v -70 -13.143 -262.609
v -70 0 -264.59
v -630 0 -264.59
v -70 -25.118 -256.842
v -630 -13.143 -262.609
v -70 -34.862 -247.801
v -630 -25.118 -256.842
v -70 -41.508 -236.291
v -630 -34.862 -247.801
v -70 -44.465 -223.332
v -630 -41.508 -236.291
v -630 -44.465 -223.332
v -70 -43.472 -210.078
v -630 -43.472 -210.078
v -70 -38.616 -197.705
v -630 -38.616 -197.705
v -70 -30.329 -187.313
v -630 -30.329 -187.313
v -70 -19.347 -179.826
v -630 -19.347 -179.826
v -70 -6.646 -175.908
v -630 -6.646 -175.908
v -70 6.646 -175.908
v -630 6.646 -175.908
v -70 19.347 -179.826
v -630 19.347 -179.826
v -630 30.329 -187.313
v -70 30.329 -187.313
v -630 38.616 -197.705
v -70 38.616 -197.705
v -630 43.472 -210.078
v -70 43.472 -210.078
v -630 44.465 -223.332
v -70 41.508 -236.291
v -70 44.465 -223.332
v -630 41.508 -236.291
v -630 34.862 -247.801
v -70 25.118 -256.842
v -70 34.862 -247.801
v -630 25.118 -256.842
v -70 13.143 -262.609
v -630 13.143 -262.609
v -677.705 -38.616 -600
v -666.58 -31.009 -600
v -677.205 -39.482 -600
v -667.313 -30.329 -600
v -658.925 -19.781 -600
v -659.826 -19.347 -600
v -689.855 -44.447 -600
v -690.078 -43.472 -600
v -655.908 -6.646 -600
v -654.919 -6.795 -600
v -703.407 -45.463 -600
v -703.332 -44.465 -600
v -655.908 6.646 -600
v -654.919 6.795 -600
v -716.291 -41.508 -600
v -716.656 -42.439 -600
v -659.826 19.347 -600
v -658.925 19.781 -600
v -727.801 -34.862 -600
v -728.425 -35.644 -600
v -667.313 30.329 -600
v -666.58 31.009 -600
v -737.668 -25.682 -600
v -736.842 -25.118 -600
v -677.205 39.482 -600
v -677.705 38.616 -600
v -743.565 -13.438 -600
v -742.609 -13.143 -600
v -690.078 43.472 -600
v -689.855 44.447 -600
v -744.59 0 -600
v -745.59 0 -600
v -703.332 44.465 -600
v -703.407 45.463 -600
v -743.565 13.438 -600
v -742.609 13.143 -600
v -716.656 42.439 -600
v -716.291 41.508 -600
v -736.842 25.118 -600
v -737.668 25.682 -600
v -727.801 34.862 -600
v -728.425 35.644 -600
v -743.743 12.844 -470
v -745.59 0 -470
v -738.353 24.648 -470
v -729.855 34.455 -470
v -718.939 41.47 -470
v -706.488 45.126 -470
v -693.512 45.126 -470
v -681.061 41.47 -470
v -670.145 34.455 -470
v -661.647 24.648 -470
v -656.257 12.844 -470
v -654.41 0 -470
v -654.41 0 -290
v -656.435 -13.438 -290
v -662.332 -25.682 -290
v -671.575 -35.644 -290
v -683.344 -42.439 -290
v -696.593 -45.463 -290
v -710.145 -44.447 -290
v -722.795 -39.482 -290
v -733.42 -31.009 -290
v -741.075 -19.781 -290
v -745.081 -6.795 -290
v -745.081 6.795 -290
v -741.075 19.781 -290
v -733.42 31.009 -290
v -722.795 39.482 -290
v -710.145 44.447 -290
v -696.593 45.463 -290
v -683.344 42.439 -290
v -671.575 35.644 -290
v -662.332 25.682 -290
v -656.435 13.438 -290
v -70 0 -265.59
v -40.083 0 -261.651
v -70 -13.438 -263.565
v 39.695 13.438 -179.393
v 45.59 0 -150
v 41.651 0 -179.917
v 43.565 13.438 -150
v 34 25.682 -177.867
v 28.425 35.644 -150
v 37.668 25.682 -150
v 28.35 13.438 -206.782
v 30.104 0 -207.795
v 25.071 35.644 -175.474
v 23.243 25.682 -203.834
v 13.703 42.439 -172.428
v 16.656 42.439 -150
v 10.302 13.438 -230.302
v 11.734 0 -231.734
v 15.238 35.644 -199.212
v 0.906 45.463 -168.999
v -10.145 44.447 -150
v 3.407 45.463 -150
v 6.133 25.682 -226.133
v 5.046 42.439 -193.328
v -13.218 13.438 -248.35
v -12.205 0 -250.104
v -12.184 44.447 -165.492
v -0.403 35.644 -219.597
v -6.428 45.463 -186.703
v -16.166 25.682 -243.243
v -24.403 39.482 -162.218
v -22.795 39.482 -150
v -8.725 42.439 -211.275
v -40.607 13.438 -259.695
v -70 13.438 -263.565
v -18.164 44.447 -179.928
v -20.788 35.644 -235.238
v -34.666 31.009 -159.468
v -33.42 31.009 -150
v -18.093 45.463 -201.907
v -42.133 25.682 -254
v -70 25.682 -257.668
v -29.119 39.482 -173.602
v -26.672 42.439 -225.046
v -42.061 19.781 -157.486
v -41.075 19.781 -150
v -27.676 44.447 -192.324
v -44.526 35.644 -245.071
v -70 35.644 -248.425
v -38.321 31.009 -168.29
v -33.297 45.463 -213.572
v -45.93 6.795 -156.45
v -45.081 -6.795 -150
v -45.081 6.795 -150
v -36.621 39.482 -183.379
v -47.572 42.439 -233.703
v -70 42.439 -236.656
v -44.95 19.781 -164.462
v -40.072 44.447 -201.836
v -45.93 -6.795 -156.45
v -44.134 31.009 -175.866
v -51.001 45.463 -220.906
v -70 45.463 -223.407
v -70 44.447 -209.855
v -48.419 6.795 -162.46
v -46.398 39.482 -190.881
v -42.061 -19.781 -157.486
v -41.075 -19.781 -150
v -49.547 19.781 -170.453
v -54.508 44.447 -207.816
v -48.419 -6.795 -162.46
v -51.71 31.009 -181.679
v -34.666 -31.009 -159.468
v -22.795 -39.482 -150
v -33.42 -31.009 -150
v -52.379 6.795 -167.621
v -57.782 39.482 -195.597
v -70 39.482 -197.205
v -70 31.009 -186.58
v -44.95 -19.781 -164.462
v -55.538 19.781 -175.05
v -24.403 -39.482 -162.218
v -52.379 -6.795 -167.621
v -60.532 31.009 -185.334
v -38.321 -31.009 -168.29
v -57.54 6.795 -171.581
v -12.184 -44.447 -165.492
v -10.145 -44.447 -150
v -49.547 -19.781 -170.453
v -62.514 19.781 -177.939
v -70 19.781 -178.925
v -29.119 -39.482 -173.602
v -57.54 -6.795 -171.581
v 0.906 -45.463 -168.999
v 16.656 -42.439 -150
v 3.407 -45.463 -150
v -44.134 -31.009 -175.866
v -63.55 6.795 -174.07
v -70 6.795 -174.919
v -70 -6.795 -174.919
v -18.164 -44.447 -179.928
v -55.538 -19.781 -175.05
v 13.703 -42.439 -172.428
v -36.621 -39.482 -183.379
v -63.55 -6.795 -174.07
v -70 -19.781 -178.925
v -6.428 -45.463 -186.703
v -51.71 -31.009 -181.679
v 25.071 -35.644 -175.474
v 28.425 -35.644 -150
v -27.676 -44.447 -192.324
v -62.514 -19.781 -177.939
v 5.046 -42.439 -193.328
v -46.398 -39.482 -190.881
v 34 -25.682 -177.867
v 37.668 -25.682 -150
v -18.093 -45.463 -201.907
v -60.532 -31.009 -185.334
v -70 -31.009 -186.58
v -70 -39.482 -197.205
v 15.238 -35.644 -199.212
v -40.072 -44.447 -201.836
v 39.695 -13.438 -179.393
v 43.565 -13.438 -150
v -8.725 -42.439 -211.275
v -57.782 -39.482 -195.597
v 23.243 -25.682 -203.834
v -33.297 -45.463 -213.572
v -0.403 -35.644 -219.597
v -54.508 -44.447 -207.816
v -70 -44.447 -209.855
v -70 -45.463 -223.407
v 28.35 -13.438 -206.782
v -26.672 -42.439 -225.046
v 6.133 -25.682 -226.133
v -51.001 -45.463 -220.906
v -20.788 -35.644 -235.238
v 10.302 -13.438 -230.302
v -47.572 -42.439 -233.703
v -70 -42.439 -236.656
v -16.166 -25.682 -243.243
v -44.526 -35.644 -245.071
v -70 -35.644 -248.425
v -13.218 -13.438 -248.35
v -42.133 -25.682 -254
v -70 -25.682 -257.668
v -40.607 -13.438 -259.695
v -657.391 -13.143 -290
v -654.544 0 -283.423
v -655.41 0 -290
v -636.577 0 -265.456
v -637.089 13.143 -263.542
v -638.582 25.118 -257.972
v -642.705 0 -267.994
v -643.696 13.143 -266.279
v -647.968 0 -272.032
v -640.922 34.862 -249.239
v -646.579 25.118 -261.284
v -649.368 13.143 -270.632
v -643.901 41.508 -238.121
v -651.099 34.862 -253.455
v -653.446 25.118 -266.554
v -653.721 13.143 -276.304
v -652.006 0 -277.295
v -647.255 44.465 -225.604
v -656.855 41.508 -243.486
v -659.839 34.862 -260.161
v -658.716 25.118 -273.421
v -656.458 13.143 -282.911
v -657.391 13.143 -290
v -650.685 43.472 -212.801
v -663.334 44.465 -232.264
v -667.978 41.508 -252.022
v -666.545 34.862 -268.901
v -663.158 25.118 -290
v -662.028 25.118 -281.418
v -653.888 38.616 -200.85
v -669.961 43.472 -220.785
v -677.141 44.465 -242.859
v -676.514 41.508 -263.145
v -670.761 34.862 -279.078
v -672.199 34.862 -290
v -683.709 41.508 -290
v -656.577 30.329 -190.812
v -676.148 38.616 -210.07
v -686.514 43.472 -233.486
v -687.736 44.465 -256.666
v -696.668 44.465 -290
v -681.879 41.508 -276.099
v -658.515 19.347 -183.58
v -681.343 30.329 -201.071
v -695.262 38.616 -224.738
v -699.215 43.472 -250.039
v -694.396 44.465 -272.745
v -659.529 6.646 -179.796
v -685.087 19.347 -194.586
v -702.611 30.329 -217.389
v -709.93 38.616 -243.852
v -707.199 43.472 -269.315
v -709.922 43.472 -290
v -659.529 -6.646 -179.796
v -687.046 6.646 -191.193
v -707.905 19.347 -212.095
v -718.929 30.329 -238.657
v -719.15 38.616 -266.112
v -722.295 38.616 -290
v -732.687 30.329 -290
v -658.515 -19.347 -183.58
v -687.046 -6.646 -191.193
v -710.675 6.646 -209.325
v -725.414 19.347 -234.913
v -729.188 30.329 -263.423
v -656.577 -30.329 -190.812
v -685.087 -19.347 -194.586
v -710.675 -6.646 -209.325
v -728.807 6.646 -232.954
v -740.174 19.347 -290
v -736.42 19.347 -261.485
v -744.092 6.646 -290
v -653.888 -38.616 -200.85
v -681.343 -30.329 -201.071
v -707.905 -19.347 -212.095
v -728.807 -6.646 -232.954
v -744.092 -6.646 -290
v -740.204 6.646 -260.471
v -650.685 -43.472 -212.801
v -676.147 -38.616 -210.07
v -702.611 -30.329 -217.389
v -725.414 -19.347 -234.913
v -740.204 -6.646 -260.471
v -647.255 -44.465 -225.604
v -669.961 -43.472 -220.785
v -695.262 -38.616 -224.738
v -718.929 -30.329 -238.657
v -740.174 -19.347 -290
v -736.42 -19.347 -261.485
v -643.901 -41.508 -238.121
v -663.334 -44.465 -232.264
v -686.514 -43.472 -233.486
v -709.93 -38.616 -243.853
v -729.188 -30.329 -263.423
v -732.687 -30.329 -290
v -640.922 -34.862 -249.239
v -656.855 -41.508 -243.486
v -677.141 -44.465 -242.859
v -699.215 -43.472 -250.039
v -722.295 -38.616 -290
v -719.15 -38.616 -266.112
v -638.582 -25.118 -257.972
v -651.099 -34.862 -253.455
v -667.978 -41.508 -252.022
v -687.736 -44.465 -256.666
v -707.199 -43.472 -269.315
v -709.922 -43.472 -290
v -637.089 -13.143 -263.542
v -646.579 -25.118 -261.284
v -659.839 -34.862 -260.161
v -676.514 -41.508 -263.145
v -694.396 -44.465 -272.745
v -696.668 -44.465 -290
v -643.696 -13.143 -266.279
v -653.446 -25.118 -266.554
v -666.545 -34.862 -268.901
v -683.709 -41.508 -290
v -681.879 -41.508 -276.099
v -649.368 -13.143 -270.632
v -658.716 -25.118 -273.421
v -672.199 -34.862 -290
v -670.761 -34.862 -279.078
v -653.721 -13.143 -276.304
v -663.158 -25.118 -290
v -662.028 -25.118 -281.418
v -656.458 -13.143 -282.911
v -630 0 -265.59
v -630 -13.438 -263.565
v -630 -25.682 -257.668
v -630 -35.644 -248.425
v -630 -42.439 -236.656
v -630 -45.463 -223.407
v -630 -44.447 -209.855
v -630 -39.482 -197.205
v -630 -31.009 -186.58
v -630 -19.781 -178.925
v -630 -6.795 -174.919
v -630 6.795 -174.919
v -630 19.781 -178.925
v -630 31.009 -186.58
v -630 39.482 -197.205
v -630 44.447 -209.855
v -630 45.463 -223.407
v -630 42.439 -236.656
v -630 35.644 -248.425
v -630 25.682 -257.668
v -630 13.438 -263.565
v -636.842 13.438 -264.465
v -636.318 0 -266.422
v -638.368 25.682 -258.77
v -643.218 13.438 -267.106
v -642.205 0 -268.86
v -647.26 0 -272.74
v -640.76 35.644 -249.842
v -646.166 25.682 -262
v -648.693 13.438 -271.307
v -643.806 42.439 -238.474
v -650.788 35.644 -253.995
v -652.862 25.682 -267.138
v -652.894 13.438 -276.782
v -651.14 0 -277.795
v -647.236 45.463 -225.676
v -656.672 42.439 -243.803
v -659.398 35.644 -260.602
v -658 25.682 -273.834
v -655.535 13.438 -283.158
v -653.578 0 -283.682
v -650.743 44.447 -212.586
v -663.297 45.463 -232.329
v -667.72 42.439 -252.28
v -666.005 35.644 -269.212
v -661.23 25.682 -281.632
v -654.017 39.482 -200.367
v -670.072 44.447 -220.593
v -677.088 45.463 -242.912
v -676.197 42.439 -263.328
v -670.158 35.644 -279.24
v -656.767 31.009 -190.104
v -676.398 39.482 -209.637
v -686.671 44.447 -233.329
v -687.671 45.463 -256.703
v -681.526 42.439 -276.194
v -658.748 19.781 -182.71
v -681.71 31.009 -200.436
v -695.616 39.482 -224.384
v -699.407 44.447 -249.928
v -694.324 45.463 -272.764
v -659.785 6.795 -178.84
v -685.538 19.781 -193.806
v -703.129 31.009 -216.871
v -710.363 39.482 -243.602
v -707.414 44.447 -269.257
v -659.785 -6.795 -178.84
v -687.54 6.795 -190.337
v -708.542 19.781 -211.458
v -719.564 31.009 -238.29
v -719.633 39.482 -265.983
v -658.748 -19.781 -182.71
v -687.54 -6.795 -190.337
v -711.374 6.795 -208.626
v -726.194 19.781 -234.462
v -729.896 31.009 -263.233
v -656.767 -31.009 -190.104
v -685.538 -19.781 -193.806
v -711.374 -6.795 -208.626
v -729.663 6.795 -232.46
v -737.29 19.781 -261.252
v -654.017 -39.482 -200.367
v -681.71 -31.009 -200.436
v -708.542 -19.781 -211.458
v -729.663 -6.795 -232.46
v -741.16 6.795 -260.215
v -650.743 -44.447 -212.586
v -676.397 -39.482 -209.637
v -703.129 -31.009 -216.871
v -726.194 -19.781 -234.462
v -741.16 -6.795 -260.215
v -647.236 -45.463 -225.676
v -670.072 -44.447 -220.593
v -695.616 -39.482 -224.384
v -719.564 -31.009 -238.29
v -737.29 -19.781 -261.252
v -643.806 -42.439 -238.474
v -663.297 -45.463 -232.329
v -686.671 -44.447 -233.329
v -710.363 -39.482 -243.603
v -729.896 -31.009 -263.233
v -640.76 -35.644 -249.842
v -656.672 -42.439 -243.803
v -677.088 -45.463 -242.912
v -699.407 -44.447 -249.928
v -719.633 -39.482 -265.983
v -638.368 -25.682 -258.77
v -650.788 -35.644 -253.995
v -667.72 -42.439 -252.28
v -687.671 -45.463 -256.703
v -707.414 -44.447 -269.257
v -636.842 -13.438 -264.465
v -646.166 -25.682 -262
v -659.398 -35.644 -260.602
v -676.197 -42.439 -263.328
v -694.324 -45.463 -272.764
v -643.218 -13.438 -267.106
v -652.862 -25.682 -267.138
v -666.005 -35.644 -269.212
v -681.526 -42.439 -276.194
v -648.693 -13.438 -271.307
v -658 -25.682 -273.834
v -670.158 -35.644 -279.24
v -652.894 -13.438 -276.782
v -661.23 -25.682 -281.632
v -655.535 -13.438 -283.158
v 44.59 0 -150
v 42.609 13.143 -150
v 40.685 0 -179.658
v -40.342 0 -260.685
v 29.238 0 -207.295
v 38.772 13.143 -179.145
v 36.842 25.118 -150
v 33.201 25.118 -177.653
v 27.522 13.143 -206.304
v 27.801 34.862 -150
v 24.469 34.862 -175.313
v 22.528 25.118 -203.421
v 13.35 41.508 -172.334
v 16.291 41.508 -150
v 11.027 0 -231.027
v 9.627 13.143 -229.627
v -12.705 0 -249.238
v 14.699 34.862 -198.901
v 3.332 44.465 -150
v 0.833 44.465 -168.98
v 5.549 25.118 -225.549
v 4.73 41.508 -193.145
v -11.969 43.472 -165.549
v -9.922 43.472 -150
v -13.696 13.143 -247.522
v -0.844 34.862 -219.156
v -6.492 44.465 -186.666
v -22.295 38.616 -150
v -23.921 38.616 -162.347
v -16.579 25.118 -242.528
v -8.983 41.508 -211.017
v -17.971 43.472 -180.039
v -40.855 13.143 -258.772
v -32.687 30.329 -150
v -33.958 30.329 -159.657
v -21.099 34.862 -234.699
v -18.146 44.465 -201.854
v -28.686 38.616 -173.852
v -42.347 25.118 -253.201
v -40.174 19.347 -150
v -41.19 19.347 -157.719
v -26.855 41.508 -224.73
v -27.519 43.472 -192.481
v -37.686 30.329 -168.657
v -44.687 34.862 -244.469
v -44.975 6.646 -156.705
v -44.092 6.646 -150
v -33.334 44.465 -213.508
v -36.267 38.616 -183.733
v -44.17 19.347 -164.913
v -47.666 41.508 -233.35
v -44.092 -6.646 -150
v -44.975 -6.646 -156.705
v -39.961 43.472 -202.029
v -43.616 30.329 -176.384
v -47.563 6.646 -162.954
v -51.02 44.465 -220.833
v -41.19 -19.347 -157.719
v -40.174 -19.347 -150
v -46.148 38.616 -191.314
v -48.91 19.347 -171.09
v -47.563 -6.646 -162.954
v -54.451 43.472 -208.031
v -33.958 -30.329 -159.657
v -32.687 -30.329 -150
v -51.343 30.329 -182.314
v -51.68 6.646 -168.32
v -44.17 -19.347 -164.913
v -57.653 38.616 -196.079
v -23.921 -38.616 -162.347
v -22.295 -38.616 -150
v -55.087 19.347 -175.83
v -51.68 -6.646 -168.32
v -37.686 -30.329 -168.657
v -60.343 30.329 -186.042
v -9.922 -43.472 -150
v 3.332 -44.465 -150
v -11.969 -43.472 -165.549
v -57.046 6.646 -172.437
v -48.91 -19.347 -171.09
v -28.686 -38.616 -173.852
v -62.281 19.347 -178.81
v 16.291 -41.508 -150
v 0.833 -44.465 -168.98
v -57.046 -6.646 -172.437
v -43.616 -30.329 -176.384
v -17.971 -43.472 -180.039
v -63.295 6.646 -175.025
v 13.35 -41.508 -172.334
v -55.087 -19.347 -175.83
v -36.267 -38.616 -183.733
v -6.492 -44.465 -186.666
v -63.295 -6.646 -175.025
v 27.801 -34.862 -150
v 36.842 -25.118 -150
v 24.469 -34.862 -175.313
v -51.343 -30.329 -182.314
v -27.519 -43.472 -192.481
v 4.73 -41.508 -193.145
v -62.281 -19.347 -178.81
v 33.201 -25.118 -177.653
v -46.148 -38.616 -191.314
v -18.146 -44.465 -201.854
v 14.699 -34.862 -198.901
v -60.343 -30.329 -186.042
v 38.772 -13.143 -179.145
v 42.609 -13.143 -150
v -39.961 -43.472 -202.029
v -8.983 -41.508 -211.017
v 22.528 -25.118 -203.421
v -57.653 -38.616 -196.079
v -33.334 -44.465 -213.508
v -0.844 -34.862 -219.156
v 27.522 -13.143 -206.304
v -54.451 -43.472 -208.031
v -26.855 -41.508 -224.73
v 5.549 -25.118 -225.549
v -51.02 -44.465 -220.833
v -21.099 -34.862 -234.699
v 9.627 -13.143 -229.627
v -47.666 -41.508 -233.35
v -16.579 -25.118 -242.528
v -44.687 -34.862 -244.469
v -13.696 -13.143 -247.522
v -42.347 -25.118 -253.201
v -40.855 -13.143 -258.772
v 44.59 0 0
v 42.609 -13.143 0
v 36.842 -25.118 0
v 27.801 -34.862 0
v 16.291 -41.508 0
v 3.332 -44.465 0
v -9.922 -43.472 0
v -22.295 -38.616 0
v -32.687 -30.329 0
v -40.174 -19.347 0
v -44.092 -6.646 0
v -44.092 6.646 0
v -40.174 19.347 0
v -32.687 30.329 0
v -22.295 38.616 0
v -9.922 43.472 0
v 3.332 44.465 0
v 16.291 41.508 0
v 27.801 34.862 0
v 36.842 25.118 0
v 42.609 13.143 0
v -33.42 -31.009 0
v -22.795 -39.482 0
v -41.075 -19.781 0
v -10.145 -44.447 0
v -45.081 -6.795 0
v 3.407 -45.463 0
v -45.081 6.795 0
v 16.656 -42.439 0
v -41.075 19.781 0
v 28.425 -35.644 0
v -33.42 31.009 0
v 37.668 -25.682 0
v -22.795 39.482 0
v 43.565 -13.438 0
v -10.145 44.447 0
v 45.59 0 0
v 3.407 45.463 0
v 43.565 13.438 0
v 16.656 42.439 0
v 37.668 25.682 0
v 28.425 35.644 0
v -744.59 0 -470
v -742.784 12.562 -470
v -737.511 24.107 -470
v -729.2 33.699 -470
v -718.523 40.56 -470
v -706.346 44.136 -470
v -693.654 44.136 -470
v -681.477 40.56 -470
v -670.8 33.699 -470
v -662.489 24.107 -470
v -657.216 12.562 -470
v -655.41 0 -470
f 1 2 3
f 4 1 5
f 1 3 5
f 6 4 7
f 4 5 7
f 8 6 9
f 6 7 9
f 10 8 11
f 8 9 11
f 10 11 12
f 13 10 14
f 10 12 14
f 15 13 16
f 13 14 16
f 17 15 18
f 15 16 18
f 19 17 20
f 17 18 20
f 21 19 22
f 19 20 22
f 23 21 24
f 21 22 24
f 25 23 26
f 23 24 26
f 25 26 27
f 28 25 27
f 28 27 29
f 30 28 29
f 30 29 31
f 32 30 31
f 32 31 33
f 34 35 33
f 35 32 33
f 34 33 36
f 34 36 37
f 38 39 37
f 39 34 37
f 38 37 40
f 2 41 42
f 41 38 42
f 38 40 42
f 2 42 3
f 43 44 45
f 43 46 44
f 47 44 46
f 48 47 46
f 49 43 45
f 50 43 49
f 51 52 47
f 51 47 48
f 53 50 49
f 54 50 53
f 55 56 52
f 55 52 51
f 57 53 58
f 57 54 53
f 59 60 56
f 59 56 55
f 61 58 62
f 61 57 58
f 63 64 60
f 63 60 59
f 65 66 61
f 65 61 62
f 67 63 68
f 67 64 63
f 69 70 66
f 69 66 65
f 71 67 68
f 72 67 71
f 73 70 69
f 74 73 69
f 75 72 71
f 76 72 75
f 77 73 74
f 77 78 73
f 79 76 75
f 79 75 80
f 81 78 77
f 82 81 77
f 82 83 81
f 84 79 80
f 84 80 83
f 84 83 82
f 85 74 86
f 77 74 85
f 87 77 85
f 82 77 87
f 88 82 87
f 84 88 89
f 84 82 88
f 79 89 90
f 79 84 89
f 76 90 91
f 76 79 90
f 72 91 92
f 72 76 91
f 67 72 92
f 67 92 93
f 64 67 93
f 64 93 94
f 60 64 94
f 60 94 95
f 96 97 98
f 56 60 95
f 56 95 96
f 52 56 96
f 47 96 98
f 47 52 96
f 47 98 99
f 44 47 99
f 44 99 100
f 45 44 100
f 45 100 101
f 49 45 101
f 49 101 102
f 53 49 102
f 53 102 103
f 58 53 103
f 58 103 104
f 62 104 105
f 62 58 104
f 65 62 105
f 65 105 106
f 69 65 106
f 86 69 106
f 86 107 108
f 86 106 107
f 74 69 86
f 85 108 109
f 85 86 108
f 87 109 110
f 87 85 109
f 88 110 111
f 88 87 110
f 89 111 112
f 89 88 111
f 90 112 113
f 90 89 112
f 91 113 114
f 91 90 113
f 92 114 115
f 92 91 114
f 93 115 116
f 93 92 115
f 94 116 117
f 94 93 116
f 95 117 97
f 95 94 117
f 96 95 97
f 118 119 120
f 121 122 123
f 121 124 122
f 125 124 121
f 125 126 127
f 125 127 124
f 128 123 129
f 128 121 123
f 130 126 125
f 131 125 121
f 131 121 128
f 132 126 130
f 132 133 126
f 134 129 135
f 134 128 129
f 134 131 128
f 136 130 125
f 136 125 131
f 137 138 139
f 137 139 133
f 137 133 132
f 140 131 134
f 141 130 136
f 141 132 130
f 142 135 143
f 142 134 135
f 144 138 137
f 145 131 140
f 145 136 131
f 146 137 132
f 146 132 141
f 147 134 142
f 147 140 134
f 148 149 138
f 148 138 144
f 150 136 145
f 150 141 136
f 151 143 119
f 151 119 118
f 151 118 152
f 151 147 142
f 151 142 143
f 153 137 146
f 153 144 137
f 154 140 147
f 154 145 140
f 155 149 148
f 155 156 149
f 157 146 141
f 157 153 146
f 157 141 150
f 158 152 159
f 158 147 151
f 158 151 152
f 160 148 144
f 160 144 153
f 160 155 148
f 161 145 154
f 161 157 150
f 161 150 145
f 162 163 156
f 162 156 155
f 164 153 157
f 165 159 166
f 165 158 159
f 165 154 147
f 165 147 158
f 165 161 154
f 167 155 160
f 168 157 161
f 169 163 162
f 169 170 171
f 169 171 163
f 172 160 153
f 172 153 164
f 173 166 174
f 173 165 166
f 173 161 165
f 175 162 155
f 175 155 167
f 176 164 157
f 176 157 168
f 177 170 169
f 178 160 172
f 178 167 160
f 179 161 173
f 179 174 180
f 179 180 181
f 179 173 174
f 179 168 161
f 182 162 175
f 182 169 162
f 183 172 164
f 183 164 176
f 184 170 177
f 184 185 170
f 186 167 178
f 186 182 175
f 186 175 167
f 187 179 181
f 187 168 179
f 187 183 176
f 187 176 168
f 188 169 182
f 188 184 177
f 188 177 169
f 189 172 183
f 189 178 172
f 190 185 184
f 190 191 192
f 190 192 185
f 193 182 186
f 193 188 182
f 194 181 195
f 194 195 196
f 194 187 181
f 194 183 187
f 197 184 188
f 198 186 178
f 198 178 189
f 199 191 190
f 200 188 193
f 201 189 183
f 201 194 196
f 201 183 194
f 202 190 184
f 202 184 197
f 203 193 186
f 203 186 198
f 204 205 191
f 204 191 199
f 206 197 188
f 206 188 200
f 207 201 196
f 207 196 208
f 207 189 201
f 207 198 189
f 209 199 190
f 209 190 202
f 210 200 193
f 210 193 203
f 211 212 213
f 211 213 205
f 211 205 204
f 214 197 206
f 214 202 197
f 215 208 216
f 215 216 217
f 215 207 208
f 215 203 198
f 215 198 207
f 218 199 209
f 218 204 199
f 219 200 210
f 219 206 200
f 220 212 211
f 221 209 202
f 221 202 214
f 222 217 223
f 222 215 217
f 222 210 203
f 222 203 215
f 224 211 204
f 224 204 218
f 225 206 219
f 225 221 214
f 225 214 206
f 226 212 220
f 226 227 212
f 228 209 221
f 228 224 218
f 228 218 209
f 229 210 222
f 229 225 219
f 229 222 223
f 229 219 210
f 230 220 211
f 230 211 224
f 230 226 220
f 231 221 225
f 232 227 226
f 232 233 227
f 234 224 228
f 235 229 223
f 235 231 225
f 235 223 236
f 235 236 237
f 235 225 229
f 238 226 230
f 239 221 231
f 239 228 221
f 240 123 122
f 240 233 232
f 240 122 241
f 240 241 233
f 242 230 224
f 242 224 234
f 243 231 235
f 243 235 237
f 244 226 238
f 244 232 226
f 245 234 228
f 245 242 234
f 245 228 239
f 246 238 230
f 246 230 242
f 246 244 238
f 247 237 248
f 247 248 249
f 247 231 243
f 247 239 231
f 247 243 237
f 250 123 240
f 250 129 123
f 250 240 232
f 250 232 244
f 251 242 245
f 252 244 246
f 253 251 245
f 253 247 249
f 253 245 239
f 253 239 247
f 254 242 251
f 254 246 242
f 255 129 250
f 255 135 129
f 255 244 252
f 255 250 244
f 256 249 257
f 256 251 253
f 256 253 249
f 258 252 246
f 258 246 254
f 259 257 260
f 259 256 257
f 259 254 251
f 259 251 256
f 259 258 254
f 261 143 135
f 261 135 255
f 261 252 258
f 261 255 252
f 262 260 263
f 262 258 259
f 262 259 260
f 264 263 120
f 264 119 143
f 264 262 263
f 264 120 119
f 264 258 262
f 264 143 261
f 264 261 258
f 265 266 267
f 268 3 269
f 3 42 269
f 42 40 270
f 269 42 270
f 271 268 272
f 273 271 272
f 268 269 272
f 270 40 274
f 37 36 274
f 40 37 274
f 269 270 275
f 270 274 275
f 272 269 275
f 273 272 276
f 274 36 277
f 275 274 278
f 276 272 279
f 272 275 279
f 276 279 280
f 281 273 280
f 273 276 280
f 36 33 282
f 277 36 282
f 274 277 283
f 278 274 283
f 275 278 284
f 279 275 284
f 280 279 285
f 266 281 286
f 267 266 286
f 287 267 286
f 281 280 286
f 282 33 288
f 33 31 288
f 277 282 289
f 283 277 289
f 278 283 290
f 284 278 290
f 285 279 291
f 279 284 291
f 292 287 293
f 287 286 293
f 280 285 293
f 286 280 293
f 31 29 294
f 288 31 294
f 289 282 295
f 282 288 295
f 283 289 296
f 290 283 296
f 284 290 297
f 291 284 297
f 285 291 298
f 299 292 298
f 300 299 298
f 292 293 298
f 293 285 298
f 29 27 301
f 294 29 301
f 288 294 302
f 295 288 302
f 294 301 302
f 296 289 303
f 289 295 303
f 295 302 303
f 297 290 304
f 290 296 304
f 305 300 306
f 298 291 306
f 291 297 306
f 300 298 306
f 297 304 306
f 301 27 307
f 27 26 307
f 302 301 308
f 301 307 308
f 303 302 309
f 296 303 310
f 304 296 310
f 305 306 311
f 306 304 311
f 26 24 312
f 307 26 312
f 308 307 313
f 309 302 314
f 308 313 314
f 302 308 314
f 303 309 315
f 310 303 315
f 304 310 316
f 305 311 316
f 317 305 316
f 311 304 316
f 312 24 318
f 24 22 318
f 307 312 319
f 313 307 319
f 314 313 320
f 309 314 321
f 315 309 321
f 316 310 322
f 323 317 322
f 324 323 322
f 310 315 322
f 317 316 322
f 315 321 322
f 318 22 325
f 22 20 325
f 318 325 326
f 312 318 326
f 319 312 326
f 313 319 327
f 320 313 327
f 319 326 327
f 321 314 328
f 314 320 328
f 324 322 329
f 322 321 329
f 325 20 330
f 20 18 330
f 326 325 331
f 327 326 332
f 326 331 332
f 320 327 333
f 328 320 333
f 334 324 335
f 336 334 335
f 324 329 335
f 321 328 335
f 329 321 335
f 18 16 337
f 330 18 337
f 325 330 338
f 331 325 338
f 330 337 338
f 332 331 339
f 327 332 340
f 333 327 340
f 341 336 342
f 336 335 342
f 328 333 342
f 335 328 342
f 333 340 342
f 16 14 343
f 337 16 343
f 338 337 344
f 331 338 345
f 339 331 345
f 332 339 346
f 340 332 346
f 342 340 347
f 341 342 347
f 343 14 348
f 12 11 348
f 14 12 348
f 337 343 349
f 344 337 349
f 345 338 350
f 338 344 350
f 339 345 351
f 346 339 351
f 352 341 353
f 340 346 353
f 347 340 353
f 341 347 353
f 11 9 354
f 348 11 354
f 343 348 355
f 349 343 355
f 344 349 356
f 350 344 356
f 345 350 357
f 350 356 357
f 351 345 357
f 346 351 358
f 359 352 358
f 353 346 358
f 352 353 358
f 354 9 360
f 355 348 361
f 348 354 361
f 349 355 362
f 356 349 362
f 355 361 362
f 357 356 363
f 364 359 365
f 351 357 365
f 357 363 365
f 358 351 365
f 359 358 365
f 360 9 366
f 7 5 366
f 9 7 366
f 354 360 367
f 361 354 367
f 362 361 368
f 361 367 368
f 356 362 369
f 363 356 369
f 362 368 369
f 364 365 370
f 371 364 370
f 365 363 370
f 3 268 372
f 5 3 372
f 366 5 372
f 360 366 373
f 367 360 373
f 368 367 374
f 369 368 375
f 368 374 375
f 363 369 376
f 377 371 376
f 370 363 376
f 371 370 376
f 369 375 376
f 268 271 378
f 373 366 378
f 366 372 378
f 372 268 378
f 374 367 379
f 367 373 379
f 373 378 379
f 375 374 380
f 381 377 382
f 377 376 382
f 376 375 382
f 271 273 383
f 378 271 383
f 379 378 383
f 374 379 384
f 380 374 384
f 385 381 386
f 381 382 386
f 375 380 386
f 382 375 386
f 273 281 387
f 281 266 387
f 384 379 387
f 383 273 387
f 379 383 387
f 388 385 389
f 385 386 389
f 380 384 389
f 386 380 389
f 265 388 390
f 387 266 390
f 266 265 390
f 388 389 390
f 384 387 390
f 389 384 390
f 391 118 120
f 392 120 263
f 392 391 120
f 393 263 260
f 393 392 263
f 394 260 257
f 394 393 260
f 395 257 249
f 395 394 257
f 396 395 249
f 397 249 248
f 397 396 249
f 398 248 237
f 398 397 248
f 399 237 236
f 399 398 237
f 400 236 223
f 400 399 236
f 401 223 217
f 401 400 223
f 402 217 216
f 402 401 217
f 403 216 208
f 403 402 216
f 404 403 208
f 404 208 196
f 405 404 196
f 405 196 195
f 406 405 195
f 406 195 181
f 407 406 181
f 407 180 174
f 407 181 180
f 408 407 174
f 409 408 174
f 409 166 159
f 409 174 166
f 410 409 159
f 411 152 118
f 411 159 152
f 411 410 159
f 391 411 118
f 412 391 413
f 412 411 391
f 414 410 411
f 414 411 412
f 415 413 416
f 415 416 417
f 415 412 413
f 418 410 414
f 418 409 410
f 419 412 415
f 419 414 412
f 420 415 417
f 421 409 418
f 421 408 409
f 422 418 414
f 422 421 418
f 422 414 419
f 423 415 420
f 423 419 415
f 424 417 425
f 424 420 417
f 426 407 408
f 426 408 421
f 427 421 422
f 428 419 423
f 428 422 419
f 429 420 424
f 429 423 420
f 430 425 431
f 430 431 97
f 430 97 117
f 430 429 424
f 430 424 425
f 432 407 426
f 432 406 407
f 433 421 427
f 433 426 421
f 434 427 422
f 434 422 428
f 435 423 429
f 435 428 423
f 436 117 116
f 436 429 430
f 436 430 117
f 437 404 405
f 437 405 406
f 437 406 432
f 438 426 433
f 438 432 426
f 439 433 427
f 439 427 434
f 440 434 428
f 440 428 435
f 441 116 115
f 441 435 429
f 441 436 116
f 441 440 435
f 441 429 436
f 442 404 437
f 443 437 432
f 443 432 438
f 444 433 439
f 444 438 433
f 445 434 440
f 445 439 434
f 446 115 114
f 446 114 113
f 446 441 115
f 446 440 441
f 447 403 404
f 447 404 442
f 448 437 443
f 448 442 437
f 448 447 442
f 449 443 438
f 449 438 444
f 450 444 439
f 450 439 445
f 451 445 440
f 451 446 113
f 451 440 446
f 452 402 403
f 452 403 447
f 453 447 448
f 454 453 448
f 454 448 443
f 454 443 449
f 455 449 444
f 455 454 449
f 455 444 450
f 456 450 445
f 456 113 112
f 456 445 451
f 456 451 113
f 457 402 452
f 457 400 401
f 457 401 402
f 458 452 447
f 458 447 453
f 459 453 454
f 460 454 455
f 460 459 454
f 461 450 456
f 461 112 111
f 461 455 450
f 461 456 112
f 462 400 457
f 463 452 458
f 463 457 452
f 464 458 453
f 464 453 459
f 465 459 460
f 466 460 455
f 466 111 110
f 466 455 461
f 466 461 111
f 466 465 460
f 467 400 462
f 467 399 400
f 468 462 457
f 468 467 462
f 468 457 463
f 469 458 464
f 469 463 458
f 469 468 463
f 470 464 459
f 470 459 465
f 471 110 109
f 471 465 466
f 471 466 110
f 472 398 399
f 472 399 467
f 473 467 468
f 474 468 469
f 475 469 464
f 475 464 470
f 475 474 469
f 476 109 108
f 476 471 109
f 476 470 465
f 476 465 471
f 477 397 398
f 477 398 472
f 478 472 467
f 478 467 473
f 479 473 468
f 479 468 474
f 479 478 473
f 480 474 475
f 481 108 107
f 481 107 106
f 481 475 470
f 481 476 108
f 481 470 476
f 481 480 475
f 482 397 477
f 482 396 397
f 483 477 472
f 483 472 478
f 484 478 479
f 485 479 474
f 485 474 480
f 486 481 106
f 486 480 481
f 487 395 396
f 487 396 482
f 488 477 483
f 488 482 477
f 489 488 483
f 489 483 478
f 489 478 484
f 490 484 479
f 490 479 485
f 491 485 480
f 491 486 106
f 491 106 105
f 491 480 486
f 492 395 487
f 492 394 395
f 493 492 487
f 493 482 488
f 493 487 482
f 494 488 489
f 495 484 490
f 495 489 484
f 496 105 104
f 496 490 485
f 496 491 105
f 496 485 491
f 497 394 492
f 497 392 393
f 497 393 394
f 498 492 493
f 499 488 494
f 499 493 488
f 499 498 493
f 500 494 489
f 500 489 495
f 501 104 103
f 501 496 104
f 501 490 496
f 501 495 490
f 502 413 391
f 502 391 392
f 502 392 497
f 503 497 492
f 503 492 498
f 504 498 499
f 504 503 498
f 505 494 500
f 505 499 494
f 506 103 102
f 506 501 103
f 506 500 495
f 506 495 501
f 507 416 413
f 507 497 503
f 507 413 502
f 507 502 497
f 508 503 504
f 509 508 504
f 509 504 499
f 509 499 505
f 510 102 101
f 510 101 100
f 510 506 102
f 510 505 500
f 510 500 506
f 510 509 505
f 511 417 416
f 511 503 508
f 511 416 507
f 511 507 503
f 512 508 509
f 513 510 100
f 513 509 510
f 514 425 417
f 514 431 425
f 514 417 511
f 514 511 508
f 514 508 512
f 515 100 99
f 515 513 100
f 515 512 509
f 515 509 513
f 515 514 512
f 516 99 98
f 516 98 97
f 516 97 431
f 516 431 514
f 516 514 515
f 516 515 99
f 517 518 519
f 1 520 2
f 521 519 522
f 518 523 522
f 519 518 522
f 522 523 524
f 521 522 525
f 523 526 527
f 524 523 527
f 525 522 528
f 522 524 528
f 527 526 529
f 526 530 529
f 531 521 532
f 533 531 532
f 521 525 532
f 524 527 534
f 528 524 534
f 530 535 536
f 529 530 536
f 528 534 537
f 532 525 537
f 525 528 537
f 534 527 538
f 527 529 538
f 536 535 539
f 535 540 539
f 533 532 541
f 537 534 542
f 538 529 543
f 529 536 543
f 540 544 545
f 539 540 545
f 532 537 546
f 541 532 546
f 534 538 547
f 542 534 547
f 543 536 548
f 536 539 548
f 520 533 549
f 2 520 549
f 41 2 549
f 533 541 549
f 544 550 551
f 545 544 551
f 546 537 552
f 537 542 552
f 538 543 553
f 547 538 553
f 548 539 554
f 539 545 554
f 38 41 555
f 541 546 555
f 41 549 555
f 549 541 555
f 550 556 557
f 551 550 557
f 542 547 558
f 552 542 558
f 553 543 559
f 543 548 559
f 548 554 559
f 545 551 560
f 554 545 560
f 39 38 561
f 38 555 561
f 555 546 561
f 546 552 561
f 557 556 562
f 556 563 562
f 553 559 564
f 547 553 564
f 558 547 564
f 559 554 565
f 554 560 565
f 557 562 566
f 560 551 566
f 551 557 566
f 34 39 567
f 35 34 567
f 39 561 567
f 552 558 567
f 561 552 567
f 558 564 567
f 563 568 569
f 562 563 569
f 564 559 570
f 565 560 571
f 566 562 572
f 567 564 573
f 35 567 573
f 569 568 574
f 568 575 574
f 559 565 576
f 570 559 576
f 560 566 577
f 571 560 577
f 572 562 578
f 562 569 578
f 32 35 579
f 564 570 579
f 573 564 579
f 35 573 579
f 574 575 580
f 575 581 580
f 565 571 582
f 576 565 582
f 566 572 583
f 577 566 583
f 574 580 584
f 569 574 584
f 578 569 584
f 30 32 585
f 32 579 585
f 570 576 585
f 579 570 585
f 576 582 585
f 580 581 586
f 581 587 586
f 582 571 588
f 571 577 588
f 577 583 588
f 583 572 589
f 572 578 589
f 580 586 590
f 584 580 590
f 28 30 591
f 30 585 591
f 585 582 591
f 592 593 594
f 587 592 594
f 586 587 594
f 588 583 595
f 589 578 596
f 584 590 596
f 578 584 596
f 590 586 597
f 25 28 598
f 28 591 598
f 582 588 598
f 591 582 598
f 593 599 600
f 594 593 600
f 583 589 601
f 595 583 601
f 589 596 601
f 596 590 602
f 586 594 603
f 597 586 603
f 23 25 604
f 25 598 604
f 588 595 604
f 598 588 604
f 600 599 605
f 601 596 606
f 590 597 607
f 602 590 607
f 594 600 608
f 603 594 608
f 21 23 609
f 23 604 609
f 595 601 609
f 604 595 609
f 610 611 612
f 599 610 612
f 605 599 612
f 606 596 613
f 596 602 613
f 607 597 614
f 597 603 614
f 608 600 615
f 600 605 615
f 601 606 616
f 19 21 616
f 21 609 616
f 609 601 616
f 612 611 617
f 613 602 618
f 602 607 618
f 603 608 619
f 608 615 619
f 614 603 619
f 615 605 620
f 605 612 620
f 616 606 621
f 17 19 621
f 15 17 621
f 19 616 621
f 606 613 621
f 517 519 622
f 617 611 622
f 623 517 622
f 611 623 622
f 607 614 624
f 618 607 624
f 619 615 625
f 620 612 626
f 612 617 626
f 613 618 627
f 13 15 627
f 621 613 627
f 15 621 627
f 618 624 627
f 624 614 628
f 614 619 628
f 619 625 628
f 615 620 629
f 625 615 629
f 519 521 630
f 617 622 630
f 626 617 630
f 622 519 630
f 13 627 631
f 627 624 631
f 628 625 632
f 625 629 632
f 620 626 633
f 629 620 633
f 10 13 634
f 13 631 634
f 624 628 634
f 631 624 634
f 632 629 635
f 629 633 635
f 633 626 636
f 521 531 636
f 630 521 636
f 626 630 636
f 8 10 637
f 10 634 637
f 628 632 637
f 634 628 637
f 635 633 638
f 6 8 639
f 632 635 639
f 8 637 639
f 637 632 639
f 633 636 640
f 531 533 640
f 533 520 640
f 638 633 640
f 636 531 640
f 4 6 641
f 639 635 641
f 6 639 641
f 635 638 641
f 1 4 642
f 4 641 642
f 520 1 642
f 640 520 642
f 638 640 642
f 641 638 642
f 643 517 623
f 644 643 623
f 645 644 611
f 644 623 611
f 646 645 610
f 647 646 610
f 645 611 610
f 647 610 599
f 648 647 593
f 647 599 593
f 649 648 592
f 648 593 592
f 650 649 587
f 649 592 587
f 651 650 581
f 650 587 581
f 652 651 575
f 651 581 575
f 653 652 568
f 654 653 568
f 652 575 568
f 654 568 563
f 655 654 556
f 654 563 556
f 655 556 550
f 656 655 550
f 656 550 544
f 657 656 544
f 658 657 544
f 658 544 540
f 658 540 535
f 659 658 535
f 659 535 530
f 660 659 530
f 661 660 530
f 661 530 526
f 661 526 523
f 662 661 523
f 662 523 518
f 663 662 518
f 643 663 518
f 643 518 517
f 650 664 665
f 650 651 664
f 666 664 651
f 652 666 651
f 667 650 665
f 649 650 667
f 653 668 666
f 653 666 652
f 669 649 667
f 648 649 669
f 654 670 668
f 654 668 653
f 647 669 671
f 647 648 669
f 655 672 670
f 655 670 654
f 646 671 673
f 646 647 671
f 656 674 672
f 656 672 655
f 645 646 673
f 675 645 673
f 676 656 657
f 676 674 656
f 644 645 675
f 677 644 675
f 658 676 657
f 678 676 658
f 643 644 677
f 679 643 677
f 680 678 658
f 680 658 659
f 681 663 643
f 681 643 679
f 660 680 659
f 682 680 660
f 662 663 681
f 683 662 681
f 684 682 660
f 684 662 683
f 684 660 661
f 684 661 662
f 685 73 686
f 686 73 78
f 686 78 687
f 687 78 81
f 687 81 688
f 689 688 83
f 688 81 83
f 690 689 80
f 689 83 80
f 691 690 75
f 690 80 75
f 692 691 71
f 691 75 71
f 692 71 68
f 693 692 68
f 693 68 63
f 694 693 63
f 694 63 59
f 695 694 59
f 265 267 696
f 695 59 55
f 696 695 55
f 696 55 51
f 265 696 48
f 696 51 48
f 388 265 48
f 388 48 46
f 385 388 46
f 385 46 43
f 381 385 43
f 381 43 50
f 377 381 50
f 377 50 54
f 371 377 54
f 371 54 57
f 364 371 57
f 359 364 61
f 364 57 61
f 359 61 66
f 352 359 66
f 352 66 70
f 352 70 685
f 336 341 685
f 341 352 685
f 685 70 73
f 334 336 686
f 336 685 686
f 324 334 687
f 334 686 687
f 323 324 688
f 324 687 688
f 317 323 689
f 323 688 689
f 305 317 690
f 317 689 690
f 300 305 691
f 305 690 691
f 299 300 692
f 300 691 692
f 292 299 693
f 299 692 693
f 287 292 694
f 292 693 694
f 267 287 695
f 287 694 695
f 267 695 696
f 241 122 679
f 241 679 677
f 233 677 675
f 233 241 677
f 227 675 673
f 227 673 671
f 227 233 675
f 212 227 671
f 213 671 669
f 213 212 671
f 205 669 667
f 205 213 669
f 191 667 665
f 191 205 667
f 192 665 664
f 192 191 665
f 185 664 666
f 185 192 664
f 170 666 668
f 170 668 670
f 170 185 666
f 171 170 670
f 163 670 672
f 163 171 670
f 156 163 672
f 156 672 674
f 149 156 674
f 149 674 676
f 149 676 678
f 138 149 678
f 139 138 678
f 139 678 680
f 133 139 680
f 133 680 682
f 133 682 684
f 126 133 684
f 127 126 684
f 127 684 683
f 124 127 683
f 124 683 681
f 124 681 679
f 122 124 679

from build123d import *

# Parameters (mm, degrees)
SKETCH2_R           = 45.59
SKETCH2_R_2         = 44.59
BOSS_EXTRUDE3_START = 130
SKETCH4_R           = 45.59
SKETCH4_R_2         = 44.59
BOSS_EXTRUDE3_DEPTH = 130


with BuildPart() as part:
    # Sweep1: sweep along a path in Sketch1
    with BuildLine(Plane(origin=(0, 0, 0), x_dir=(1, 0, 0), z_dir=(0, 1, 0))) as sweep1_path:
        Line((0, 0), (0, 150))
        ThreePointArc((0, 150), (-20.502525317, 199.497474683), (-70, 220))
        Line((-70, 220), (-630, 220))
        ThreePointArc((-630, 220), (-679.497474683, 240.502525317), (-700, 290))
        Line((-700, 290), (-700, 470))
    # Sketch2 → Sweep1 (sweep)
    with BuildSketch(Plane.XY):
        Circle(SKETCH2_R)
        Circle(SKETCH2_R_2, mode=Mode.SUBTRACT)
    sweep(path=sweep1_path.line)

    # Sketch4 → Boss-Extrude3 (add)
    with BuildSketch(Plane(origin=(0, 0, -470), x_dir=(-1, 0, 0), z_dir=(0, 0, -1)).offset(BOSS_EXTRUDE3_START)):
        with Locations((700, 0)):
            Circle(SKETCH4_R)
        with Locations((700, 0)):
            Circle(SKETCH4_R_2, mode=Mode.SUBTRACT)
    extrude(amount=-BOSS_EXTRUDE3_DEPTH)


solid = part.part
